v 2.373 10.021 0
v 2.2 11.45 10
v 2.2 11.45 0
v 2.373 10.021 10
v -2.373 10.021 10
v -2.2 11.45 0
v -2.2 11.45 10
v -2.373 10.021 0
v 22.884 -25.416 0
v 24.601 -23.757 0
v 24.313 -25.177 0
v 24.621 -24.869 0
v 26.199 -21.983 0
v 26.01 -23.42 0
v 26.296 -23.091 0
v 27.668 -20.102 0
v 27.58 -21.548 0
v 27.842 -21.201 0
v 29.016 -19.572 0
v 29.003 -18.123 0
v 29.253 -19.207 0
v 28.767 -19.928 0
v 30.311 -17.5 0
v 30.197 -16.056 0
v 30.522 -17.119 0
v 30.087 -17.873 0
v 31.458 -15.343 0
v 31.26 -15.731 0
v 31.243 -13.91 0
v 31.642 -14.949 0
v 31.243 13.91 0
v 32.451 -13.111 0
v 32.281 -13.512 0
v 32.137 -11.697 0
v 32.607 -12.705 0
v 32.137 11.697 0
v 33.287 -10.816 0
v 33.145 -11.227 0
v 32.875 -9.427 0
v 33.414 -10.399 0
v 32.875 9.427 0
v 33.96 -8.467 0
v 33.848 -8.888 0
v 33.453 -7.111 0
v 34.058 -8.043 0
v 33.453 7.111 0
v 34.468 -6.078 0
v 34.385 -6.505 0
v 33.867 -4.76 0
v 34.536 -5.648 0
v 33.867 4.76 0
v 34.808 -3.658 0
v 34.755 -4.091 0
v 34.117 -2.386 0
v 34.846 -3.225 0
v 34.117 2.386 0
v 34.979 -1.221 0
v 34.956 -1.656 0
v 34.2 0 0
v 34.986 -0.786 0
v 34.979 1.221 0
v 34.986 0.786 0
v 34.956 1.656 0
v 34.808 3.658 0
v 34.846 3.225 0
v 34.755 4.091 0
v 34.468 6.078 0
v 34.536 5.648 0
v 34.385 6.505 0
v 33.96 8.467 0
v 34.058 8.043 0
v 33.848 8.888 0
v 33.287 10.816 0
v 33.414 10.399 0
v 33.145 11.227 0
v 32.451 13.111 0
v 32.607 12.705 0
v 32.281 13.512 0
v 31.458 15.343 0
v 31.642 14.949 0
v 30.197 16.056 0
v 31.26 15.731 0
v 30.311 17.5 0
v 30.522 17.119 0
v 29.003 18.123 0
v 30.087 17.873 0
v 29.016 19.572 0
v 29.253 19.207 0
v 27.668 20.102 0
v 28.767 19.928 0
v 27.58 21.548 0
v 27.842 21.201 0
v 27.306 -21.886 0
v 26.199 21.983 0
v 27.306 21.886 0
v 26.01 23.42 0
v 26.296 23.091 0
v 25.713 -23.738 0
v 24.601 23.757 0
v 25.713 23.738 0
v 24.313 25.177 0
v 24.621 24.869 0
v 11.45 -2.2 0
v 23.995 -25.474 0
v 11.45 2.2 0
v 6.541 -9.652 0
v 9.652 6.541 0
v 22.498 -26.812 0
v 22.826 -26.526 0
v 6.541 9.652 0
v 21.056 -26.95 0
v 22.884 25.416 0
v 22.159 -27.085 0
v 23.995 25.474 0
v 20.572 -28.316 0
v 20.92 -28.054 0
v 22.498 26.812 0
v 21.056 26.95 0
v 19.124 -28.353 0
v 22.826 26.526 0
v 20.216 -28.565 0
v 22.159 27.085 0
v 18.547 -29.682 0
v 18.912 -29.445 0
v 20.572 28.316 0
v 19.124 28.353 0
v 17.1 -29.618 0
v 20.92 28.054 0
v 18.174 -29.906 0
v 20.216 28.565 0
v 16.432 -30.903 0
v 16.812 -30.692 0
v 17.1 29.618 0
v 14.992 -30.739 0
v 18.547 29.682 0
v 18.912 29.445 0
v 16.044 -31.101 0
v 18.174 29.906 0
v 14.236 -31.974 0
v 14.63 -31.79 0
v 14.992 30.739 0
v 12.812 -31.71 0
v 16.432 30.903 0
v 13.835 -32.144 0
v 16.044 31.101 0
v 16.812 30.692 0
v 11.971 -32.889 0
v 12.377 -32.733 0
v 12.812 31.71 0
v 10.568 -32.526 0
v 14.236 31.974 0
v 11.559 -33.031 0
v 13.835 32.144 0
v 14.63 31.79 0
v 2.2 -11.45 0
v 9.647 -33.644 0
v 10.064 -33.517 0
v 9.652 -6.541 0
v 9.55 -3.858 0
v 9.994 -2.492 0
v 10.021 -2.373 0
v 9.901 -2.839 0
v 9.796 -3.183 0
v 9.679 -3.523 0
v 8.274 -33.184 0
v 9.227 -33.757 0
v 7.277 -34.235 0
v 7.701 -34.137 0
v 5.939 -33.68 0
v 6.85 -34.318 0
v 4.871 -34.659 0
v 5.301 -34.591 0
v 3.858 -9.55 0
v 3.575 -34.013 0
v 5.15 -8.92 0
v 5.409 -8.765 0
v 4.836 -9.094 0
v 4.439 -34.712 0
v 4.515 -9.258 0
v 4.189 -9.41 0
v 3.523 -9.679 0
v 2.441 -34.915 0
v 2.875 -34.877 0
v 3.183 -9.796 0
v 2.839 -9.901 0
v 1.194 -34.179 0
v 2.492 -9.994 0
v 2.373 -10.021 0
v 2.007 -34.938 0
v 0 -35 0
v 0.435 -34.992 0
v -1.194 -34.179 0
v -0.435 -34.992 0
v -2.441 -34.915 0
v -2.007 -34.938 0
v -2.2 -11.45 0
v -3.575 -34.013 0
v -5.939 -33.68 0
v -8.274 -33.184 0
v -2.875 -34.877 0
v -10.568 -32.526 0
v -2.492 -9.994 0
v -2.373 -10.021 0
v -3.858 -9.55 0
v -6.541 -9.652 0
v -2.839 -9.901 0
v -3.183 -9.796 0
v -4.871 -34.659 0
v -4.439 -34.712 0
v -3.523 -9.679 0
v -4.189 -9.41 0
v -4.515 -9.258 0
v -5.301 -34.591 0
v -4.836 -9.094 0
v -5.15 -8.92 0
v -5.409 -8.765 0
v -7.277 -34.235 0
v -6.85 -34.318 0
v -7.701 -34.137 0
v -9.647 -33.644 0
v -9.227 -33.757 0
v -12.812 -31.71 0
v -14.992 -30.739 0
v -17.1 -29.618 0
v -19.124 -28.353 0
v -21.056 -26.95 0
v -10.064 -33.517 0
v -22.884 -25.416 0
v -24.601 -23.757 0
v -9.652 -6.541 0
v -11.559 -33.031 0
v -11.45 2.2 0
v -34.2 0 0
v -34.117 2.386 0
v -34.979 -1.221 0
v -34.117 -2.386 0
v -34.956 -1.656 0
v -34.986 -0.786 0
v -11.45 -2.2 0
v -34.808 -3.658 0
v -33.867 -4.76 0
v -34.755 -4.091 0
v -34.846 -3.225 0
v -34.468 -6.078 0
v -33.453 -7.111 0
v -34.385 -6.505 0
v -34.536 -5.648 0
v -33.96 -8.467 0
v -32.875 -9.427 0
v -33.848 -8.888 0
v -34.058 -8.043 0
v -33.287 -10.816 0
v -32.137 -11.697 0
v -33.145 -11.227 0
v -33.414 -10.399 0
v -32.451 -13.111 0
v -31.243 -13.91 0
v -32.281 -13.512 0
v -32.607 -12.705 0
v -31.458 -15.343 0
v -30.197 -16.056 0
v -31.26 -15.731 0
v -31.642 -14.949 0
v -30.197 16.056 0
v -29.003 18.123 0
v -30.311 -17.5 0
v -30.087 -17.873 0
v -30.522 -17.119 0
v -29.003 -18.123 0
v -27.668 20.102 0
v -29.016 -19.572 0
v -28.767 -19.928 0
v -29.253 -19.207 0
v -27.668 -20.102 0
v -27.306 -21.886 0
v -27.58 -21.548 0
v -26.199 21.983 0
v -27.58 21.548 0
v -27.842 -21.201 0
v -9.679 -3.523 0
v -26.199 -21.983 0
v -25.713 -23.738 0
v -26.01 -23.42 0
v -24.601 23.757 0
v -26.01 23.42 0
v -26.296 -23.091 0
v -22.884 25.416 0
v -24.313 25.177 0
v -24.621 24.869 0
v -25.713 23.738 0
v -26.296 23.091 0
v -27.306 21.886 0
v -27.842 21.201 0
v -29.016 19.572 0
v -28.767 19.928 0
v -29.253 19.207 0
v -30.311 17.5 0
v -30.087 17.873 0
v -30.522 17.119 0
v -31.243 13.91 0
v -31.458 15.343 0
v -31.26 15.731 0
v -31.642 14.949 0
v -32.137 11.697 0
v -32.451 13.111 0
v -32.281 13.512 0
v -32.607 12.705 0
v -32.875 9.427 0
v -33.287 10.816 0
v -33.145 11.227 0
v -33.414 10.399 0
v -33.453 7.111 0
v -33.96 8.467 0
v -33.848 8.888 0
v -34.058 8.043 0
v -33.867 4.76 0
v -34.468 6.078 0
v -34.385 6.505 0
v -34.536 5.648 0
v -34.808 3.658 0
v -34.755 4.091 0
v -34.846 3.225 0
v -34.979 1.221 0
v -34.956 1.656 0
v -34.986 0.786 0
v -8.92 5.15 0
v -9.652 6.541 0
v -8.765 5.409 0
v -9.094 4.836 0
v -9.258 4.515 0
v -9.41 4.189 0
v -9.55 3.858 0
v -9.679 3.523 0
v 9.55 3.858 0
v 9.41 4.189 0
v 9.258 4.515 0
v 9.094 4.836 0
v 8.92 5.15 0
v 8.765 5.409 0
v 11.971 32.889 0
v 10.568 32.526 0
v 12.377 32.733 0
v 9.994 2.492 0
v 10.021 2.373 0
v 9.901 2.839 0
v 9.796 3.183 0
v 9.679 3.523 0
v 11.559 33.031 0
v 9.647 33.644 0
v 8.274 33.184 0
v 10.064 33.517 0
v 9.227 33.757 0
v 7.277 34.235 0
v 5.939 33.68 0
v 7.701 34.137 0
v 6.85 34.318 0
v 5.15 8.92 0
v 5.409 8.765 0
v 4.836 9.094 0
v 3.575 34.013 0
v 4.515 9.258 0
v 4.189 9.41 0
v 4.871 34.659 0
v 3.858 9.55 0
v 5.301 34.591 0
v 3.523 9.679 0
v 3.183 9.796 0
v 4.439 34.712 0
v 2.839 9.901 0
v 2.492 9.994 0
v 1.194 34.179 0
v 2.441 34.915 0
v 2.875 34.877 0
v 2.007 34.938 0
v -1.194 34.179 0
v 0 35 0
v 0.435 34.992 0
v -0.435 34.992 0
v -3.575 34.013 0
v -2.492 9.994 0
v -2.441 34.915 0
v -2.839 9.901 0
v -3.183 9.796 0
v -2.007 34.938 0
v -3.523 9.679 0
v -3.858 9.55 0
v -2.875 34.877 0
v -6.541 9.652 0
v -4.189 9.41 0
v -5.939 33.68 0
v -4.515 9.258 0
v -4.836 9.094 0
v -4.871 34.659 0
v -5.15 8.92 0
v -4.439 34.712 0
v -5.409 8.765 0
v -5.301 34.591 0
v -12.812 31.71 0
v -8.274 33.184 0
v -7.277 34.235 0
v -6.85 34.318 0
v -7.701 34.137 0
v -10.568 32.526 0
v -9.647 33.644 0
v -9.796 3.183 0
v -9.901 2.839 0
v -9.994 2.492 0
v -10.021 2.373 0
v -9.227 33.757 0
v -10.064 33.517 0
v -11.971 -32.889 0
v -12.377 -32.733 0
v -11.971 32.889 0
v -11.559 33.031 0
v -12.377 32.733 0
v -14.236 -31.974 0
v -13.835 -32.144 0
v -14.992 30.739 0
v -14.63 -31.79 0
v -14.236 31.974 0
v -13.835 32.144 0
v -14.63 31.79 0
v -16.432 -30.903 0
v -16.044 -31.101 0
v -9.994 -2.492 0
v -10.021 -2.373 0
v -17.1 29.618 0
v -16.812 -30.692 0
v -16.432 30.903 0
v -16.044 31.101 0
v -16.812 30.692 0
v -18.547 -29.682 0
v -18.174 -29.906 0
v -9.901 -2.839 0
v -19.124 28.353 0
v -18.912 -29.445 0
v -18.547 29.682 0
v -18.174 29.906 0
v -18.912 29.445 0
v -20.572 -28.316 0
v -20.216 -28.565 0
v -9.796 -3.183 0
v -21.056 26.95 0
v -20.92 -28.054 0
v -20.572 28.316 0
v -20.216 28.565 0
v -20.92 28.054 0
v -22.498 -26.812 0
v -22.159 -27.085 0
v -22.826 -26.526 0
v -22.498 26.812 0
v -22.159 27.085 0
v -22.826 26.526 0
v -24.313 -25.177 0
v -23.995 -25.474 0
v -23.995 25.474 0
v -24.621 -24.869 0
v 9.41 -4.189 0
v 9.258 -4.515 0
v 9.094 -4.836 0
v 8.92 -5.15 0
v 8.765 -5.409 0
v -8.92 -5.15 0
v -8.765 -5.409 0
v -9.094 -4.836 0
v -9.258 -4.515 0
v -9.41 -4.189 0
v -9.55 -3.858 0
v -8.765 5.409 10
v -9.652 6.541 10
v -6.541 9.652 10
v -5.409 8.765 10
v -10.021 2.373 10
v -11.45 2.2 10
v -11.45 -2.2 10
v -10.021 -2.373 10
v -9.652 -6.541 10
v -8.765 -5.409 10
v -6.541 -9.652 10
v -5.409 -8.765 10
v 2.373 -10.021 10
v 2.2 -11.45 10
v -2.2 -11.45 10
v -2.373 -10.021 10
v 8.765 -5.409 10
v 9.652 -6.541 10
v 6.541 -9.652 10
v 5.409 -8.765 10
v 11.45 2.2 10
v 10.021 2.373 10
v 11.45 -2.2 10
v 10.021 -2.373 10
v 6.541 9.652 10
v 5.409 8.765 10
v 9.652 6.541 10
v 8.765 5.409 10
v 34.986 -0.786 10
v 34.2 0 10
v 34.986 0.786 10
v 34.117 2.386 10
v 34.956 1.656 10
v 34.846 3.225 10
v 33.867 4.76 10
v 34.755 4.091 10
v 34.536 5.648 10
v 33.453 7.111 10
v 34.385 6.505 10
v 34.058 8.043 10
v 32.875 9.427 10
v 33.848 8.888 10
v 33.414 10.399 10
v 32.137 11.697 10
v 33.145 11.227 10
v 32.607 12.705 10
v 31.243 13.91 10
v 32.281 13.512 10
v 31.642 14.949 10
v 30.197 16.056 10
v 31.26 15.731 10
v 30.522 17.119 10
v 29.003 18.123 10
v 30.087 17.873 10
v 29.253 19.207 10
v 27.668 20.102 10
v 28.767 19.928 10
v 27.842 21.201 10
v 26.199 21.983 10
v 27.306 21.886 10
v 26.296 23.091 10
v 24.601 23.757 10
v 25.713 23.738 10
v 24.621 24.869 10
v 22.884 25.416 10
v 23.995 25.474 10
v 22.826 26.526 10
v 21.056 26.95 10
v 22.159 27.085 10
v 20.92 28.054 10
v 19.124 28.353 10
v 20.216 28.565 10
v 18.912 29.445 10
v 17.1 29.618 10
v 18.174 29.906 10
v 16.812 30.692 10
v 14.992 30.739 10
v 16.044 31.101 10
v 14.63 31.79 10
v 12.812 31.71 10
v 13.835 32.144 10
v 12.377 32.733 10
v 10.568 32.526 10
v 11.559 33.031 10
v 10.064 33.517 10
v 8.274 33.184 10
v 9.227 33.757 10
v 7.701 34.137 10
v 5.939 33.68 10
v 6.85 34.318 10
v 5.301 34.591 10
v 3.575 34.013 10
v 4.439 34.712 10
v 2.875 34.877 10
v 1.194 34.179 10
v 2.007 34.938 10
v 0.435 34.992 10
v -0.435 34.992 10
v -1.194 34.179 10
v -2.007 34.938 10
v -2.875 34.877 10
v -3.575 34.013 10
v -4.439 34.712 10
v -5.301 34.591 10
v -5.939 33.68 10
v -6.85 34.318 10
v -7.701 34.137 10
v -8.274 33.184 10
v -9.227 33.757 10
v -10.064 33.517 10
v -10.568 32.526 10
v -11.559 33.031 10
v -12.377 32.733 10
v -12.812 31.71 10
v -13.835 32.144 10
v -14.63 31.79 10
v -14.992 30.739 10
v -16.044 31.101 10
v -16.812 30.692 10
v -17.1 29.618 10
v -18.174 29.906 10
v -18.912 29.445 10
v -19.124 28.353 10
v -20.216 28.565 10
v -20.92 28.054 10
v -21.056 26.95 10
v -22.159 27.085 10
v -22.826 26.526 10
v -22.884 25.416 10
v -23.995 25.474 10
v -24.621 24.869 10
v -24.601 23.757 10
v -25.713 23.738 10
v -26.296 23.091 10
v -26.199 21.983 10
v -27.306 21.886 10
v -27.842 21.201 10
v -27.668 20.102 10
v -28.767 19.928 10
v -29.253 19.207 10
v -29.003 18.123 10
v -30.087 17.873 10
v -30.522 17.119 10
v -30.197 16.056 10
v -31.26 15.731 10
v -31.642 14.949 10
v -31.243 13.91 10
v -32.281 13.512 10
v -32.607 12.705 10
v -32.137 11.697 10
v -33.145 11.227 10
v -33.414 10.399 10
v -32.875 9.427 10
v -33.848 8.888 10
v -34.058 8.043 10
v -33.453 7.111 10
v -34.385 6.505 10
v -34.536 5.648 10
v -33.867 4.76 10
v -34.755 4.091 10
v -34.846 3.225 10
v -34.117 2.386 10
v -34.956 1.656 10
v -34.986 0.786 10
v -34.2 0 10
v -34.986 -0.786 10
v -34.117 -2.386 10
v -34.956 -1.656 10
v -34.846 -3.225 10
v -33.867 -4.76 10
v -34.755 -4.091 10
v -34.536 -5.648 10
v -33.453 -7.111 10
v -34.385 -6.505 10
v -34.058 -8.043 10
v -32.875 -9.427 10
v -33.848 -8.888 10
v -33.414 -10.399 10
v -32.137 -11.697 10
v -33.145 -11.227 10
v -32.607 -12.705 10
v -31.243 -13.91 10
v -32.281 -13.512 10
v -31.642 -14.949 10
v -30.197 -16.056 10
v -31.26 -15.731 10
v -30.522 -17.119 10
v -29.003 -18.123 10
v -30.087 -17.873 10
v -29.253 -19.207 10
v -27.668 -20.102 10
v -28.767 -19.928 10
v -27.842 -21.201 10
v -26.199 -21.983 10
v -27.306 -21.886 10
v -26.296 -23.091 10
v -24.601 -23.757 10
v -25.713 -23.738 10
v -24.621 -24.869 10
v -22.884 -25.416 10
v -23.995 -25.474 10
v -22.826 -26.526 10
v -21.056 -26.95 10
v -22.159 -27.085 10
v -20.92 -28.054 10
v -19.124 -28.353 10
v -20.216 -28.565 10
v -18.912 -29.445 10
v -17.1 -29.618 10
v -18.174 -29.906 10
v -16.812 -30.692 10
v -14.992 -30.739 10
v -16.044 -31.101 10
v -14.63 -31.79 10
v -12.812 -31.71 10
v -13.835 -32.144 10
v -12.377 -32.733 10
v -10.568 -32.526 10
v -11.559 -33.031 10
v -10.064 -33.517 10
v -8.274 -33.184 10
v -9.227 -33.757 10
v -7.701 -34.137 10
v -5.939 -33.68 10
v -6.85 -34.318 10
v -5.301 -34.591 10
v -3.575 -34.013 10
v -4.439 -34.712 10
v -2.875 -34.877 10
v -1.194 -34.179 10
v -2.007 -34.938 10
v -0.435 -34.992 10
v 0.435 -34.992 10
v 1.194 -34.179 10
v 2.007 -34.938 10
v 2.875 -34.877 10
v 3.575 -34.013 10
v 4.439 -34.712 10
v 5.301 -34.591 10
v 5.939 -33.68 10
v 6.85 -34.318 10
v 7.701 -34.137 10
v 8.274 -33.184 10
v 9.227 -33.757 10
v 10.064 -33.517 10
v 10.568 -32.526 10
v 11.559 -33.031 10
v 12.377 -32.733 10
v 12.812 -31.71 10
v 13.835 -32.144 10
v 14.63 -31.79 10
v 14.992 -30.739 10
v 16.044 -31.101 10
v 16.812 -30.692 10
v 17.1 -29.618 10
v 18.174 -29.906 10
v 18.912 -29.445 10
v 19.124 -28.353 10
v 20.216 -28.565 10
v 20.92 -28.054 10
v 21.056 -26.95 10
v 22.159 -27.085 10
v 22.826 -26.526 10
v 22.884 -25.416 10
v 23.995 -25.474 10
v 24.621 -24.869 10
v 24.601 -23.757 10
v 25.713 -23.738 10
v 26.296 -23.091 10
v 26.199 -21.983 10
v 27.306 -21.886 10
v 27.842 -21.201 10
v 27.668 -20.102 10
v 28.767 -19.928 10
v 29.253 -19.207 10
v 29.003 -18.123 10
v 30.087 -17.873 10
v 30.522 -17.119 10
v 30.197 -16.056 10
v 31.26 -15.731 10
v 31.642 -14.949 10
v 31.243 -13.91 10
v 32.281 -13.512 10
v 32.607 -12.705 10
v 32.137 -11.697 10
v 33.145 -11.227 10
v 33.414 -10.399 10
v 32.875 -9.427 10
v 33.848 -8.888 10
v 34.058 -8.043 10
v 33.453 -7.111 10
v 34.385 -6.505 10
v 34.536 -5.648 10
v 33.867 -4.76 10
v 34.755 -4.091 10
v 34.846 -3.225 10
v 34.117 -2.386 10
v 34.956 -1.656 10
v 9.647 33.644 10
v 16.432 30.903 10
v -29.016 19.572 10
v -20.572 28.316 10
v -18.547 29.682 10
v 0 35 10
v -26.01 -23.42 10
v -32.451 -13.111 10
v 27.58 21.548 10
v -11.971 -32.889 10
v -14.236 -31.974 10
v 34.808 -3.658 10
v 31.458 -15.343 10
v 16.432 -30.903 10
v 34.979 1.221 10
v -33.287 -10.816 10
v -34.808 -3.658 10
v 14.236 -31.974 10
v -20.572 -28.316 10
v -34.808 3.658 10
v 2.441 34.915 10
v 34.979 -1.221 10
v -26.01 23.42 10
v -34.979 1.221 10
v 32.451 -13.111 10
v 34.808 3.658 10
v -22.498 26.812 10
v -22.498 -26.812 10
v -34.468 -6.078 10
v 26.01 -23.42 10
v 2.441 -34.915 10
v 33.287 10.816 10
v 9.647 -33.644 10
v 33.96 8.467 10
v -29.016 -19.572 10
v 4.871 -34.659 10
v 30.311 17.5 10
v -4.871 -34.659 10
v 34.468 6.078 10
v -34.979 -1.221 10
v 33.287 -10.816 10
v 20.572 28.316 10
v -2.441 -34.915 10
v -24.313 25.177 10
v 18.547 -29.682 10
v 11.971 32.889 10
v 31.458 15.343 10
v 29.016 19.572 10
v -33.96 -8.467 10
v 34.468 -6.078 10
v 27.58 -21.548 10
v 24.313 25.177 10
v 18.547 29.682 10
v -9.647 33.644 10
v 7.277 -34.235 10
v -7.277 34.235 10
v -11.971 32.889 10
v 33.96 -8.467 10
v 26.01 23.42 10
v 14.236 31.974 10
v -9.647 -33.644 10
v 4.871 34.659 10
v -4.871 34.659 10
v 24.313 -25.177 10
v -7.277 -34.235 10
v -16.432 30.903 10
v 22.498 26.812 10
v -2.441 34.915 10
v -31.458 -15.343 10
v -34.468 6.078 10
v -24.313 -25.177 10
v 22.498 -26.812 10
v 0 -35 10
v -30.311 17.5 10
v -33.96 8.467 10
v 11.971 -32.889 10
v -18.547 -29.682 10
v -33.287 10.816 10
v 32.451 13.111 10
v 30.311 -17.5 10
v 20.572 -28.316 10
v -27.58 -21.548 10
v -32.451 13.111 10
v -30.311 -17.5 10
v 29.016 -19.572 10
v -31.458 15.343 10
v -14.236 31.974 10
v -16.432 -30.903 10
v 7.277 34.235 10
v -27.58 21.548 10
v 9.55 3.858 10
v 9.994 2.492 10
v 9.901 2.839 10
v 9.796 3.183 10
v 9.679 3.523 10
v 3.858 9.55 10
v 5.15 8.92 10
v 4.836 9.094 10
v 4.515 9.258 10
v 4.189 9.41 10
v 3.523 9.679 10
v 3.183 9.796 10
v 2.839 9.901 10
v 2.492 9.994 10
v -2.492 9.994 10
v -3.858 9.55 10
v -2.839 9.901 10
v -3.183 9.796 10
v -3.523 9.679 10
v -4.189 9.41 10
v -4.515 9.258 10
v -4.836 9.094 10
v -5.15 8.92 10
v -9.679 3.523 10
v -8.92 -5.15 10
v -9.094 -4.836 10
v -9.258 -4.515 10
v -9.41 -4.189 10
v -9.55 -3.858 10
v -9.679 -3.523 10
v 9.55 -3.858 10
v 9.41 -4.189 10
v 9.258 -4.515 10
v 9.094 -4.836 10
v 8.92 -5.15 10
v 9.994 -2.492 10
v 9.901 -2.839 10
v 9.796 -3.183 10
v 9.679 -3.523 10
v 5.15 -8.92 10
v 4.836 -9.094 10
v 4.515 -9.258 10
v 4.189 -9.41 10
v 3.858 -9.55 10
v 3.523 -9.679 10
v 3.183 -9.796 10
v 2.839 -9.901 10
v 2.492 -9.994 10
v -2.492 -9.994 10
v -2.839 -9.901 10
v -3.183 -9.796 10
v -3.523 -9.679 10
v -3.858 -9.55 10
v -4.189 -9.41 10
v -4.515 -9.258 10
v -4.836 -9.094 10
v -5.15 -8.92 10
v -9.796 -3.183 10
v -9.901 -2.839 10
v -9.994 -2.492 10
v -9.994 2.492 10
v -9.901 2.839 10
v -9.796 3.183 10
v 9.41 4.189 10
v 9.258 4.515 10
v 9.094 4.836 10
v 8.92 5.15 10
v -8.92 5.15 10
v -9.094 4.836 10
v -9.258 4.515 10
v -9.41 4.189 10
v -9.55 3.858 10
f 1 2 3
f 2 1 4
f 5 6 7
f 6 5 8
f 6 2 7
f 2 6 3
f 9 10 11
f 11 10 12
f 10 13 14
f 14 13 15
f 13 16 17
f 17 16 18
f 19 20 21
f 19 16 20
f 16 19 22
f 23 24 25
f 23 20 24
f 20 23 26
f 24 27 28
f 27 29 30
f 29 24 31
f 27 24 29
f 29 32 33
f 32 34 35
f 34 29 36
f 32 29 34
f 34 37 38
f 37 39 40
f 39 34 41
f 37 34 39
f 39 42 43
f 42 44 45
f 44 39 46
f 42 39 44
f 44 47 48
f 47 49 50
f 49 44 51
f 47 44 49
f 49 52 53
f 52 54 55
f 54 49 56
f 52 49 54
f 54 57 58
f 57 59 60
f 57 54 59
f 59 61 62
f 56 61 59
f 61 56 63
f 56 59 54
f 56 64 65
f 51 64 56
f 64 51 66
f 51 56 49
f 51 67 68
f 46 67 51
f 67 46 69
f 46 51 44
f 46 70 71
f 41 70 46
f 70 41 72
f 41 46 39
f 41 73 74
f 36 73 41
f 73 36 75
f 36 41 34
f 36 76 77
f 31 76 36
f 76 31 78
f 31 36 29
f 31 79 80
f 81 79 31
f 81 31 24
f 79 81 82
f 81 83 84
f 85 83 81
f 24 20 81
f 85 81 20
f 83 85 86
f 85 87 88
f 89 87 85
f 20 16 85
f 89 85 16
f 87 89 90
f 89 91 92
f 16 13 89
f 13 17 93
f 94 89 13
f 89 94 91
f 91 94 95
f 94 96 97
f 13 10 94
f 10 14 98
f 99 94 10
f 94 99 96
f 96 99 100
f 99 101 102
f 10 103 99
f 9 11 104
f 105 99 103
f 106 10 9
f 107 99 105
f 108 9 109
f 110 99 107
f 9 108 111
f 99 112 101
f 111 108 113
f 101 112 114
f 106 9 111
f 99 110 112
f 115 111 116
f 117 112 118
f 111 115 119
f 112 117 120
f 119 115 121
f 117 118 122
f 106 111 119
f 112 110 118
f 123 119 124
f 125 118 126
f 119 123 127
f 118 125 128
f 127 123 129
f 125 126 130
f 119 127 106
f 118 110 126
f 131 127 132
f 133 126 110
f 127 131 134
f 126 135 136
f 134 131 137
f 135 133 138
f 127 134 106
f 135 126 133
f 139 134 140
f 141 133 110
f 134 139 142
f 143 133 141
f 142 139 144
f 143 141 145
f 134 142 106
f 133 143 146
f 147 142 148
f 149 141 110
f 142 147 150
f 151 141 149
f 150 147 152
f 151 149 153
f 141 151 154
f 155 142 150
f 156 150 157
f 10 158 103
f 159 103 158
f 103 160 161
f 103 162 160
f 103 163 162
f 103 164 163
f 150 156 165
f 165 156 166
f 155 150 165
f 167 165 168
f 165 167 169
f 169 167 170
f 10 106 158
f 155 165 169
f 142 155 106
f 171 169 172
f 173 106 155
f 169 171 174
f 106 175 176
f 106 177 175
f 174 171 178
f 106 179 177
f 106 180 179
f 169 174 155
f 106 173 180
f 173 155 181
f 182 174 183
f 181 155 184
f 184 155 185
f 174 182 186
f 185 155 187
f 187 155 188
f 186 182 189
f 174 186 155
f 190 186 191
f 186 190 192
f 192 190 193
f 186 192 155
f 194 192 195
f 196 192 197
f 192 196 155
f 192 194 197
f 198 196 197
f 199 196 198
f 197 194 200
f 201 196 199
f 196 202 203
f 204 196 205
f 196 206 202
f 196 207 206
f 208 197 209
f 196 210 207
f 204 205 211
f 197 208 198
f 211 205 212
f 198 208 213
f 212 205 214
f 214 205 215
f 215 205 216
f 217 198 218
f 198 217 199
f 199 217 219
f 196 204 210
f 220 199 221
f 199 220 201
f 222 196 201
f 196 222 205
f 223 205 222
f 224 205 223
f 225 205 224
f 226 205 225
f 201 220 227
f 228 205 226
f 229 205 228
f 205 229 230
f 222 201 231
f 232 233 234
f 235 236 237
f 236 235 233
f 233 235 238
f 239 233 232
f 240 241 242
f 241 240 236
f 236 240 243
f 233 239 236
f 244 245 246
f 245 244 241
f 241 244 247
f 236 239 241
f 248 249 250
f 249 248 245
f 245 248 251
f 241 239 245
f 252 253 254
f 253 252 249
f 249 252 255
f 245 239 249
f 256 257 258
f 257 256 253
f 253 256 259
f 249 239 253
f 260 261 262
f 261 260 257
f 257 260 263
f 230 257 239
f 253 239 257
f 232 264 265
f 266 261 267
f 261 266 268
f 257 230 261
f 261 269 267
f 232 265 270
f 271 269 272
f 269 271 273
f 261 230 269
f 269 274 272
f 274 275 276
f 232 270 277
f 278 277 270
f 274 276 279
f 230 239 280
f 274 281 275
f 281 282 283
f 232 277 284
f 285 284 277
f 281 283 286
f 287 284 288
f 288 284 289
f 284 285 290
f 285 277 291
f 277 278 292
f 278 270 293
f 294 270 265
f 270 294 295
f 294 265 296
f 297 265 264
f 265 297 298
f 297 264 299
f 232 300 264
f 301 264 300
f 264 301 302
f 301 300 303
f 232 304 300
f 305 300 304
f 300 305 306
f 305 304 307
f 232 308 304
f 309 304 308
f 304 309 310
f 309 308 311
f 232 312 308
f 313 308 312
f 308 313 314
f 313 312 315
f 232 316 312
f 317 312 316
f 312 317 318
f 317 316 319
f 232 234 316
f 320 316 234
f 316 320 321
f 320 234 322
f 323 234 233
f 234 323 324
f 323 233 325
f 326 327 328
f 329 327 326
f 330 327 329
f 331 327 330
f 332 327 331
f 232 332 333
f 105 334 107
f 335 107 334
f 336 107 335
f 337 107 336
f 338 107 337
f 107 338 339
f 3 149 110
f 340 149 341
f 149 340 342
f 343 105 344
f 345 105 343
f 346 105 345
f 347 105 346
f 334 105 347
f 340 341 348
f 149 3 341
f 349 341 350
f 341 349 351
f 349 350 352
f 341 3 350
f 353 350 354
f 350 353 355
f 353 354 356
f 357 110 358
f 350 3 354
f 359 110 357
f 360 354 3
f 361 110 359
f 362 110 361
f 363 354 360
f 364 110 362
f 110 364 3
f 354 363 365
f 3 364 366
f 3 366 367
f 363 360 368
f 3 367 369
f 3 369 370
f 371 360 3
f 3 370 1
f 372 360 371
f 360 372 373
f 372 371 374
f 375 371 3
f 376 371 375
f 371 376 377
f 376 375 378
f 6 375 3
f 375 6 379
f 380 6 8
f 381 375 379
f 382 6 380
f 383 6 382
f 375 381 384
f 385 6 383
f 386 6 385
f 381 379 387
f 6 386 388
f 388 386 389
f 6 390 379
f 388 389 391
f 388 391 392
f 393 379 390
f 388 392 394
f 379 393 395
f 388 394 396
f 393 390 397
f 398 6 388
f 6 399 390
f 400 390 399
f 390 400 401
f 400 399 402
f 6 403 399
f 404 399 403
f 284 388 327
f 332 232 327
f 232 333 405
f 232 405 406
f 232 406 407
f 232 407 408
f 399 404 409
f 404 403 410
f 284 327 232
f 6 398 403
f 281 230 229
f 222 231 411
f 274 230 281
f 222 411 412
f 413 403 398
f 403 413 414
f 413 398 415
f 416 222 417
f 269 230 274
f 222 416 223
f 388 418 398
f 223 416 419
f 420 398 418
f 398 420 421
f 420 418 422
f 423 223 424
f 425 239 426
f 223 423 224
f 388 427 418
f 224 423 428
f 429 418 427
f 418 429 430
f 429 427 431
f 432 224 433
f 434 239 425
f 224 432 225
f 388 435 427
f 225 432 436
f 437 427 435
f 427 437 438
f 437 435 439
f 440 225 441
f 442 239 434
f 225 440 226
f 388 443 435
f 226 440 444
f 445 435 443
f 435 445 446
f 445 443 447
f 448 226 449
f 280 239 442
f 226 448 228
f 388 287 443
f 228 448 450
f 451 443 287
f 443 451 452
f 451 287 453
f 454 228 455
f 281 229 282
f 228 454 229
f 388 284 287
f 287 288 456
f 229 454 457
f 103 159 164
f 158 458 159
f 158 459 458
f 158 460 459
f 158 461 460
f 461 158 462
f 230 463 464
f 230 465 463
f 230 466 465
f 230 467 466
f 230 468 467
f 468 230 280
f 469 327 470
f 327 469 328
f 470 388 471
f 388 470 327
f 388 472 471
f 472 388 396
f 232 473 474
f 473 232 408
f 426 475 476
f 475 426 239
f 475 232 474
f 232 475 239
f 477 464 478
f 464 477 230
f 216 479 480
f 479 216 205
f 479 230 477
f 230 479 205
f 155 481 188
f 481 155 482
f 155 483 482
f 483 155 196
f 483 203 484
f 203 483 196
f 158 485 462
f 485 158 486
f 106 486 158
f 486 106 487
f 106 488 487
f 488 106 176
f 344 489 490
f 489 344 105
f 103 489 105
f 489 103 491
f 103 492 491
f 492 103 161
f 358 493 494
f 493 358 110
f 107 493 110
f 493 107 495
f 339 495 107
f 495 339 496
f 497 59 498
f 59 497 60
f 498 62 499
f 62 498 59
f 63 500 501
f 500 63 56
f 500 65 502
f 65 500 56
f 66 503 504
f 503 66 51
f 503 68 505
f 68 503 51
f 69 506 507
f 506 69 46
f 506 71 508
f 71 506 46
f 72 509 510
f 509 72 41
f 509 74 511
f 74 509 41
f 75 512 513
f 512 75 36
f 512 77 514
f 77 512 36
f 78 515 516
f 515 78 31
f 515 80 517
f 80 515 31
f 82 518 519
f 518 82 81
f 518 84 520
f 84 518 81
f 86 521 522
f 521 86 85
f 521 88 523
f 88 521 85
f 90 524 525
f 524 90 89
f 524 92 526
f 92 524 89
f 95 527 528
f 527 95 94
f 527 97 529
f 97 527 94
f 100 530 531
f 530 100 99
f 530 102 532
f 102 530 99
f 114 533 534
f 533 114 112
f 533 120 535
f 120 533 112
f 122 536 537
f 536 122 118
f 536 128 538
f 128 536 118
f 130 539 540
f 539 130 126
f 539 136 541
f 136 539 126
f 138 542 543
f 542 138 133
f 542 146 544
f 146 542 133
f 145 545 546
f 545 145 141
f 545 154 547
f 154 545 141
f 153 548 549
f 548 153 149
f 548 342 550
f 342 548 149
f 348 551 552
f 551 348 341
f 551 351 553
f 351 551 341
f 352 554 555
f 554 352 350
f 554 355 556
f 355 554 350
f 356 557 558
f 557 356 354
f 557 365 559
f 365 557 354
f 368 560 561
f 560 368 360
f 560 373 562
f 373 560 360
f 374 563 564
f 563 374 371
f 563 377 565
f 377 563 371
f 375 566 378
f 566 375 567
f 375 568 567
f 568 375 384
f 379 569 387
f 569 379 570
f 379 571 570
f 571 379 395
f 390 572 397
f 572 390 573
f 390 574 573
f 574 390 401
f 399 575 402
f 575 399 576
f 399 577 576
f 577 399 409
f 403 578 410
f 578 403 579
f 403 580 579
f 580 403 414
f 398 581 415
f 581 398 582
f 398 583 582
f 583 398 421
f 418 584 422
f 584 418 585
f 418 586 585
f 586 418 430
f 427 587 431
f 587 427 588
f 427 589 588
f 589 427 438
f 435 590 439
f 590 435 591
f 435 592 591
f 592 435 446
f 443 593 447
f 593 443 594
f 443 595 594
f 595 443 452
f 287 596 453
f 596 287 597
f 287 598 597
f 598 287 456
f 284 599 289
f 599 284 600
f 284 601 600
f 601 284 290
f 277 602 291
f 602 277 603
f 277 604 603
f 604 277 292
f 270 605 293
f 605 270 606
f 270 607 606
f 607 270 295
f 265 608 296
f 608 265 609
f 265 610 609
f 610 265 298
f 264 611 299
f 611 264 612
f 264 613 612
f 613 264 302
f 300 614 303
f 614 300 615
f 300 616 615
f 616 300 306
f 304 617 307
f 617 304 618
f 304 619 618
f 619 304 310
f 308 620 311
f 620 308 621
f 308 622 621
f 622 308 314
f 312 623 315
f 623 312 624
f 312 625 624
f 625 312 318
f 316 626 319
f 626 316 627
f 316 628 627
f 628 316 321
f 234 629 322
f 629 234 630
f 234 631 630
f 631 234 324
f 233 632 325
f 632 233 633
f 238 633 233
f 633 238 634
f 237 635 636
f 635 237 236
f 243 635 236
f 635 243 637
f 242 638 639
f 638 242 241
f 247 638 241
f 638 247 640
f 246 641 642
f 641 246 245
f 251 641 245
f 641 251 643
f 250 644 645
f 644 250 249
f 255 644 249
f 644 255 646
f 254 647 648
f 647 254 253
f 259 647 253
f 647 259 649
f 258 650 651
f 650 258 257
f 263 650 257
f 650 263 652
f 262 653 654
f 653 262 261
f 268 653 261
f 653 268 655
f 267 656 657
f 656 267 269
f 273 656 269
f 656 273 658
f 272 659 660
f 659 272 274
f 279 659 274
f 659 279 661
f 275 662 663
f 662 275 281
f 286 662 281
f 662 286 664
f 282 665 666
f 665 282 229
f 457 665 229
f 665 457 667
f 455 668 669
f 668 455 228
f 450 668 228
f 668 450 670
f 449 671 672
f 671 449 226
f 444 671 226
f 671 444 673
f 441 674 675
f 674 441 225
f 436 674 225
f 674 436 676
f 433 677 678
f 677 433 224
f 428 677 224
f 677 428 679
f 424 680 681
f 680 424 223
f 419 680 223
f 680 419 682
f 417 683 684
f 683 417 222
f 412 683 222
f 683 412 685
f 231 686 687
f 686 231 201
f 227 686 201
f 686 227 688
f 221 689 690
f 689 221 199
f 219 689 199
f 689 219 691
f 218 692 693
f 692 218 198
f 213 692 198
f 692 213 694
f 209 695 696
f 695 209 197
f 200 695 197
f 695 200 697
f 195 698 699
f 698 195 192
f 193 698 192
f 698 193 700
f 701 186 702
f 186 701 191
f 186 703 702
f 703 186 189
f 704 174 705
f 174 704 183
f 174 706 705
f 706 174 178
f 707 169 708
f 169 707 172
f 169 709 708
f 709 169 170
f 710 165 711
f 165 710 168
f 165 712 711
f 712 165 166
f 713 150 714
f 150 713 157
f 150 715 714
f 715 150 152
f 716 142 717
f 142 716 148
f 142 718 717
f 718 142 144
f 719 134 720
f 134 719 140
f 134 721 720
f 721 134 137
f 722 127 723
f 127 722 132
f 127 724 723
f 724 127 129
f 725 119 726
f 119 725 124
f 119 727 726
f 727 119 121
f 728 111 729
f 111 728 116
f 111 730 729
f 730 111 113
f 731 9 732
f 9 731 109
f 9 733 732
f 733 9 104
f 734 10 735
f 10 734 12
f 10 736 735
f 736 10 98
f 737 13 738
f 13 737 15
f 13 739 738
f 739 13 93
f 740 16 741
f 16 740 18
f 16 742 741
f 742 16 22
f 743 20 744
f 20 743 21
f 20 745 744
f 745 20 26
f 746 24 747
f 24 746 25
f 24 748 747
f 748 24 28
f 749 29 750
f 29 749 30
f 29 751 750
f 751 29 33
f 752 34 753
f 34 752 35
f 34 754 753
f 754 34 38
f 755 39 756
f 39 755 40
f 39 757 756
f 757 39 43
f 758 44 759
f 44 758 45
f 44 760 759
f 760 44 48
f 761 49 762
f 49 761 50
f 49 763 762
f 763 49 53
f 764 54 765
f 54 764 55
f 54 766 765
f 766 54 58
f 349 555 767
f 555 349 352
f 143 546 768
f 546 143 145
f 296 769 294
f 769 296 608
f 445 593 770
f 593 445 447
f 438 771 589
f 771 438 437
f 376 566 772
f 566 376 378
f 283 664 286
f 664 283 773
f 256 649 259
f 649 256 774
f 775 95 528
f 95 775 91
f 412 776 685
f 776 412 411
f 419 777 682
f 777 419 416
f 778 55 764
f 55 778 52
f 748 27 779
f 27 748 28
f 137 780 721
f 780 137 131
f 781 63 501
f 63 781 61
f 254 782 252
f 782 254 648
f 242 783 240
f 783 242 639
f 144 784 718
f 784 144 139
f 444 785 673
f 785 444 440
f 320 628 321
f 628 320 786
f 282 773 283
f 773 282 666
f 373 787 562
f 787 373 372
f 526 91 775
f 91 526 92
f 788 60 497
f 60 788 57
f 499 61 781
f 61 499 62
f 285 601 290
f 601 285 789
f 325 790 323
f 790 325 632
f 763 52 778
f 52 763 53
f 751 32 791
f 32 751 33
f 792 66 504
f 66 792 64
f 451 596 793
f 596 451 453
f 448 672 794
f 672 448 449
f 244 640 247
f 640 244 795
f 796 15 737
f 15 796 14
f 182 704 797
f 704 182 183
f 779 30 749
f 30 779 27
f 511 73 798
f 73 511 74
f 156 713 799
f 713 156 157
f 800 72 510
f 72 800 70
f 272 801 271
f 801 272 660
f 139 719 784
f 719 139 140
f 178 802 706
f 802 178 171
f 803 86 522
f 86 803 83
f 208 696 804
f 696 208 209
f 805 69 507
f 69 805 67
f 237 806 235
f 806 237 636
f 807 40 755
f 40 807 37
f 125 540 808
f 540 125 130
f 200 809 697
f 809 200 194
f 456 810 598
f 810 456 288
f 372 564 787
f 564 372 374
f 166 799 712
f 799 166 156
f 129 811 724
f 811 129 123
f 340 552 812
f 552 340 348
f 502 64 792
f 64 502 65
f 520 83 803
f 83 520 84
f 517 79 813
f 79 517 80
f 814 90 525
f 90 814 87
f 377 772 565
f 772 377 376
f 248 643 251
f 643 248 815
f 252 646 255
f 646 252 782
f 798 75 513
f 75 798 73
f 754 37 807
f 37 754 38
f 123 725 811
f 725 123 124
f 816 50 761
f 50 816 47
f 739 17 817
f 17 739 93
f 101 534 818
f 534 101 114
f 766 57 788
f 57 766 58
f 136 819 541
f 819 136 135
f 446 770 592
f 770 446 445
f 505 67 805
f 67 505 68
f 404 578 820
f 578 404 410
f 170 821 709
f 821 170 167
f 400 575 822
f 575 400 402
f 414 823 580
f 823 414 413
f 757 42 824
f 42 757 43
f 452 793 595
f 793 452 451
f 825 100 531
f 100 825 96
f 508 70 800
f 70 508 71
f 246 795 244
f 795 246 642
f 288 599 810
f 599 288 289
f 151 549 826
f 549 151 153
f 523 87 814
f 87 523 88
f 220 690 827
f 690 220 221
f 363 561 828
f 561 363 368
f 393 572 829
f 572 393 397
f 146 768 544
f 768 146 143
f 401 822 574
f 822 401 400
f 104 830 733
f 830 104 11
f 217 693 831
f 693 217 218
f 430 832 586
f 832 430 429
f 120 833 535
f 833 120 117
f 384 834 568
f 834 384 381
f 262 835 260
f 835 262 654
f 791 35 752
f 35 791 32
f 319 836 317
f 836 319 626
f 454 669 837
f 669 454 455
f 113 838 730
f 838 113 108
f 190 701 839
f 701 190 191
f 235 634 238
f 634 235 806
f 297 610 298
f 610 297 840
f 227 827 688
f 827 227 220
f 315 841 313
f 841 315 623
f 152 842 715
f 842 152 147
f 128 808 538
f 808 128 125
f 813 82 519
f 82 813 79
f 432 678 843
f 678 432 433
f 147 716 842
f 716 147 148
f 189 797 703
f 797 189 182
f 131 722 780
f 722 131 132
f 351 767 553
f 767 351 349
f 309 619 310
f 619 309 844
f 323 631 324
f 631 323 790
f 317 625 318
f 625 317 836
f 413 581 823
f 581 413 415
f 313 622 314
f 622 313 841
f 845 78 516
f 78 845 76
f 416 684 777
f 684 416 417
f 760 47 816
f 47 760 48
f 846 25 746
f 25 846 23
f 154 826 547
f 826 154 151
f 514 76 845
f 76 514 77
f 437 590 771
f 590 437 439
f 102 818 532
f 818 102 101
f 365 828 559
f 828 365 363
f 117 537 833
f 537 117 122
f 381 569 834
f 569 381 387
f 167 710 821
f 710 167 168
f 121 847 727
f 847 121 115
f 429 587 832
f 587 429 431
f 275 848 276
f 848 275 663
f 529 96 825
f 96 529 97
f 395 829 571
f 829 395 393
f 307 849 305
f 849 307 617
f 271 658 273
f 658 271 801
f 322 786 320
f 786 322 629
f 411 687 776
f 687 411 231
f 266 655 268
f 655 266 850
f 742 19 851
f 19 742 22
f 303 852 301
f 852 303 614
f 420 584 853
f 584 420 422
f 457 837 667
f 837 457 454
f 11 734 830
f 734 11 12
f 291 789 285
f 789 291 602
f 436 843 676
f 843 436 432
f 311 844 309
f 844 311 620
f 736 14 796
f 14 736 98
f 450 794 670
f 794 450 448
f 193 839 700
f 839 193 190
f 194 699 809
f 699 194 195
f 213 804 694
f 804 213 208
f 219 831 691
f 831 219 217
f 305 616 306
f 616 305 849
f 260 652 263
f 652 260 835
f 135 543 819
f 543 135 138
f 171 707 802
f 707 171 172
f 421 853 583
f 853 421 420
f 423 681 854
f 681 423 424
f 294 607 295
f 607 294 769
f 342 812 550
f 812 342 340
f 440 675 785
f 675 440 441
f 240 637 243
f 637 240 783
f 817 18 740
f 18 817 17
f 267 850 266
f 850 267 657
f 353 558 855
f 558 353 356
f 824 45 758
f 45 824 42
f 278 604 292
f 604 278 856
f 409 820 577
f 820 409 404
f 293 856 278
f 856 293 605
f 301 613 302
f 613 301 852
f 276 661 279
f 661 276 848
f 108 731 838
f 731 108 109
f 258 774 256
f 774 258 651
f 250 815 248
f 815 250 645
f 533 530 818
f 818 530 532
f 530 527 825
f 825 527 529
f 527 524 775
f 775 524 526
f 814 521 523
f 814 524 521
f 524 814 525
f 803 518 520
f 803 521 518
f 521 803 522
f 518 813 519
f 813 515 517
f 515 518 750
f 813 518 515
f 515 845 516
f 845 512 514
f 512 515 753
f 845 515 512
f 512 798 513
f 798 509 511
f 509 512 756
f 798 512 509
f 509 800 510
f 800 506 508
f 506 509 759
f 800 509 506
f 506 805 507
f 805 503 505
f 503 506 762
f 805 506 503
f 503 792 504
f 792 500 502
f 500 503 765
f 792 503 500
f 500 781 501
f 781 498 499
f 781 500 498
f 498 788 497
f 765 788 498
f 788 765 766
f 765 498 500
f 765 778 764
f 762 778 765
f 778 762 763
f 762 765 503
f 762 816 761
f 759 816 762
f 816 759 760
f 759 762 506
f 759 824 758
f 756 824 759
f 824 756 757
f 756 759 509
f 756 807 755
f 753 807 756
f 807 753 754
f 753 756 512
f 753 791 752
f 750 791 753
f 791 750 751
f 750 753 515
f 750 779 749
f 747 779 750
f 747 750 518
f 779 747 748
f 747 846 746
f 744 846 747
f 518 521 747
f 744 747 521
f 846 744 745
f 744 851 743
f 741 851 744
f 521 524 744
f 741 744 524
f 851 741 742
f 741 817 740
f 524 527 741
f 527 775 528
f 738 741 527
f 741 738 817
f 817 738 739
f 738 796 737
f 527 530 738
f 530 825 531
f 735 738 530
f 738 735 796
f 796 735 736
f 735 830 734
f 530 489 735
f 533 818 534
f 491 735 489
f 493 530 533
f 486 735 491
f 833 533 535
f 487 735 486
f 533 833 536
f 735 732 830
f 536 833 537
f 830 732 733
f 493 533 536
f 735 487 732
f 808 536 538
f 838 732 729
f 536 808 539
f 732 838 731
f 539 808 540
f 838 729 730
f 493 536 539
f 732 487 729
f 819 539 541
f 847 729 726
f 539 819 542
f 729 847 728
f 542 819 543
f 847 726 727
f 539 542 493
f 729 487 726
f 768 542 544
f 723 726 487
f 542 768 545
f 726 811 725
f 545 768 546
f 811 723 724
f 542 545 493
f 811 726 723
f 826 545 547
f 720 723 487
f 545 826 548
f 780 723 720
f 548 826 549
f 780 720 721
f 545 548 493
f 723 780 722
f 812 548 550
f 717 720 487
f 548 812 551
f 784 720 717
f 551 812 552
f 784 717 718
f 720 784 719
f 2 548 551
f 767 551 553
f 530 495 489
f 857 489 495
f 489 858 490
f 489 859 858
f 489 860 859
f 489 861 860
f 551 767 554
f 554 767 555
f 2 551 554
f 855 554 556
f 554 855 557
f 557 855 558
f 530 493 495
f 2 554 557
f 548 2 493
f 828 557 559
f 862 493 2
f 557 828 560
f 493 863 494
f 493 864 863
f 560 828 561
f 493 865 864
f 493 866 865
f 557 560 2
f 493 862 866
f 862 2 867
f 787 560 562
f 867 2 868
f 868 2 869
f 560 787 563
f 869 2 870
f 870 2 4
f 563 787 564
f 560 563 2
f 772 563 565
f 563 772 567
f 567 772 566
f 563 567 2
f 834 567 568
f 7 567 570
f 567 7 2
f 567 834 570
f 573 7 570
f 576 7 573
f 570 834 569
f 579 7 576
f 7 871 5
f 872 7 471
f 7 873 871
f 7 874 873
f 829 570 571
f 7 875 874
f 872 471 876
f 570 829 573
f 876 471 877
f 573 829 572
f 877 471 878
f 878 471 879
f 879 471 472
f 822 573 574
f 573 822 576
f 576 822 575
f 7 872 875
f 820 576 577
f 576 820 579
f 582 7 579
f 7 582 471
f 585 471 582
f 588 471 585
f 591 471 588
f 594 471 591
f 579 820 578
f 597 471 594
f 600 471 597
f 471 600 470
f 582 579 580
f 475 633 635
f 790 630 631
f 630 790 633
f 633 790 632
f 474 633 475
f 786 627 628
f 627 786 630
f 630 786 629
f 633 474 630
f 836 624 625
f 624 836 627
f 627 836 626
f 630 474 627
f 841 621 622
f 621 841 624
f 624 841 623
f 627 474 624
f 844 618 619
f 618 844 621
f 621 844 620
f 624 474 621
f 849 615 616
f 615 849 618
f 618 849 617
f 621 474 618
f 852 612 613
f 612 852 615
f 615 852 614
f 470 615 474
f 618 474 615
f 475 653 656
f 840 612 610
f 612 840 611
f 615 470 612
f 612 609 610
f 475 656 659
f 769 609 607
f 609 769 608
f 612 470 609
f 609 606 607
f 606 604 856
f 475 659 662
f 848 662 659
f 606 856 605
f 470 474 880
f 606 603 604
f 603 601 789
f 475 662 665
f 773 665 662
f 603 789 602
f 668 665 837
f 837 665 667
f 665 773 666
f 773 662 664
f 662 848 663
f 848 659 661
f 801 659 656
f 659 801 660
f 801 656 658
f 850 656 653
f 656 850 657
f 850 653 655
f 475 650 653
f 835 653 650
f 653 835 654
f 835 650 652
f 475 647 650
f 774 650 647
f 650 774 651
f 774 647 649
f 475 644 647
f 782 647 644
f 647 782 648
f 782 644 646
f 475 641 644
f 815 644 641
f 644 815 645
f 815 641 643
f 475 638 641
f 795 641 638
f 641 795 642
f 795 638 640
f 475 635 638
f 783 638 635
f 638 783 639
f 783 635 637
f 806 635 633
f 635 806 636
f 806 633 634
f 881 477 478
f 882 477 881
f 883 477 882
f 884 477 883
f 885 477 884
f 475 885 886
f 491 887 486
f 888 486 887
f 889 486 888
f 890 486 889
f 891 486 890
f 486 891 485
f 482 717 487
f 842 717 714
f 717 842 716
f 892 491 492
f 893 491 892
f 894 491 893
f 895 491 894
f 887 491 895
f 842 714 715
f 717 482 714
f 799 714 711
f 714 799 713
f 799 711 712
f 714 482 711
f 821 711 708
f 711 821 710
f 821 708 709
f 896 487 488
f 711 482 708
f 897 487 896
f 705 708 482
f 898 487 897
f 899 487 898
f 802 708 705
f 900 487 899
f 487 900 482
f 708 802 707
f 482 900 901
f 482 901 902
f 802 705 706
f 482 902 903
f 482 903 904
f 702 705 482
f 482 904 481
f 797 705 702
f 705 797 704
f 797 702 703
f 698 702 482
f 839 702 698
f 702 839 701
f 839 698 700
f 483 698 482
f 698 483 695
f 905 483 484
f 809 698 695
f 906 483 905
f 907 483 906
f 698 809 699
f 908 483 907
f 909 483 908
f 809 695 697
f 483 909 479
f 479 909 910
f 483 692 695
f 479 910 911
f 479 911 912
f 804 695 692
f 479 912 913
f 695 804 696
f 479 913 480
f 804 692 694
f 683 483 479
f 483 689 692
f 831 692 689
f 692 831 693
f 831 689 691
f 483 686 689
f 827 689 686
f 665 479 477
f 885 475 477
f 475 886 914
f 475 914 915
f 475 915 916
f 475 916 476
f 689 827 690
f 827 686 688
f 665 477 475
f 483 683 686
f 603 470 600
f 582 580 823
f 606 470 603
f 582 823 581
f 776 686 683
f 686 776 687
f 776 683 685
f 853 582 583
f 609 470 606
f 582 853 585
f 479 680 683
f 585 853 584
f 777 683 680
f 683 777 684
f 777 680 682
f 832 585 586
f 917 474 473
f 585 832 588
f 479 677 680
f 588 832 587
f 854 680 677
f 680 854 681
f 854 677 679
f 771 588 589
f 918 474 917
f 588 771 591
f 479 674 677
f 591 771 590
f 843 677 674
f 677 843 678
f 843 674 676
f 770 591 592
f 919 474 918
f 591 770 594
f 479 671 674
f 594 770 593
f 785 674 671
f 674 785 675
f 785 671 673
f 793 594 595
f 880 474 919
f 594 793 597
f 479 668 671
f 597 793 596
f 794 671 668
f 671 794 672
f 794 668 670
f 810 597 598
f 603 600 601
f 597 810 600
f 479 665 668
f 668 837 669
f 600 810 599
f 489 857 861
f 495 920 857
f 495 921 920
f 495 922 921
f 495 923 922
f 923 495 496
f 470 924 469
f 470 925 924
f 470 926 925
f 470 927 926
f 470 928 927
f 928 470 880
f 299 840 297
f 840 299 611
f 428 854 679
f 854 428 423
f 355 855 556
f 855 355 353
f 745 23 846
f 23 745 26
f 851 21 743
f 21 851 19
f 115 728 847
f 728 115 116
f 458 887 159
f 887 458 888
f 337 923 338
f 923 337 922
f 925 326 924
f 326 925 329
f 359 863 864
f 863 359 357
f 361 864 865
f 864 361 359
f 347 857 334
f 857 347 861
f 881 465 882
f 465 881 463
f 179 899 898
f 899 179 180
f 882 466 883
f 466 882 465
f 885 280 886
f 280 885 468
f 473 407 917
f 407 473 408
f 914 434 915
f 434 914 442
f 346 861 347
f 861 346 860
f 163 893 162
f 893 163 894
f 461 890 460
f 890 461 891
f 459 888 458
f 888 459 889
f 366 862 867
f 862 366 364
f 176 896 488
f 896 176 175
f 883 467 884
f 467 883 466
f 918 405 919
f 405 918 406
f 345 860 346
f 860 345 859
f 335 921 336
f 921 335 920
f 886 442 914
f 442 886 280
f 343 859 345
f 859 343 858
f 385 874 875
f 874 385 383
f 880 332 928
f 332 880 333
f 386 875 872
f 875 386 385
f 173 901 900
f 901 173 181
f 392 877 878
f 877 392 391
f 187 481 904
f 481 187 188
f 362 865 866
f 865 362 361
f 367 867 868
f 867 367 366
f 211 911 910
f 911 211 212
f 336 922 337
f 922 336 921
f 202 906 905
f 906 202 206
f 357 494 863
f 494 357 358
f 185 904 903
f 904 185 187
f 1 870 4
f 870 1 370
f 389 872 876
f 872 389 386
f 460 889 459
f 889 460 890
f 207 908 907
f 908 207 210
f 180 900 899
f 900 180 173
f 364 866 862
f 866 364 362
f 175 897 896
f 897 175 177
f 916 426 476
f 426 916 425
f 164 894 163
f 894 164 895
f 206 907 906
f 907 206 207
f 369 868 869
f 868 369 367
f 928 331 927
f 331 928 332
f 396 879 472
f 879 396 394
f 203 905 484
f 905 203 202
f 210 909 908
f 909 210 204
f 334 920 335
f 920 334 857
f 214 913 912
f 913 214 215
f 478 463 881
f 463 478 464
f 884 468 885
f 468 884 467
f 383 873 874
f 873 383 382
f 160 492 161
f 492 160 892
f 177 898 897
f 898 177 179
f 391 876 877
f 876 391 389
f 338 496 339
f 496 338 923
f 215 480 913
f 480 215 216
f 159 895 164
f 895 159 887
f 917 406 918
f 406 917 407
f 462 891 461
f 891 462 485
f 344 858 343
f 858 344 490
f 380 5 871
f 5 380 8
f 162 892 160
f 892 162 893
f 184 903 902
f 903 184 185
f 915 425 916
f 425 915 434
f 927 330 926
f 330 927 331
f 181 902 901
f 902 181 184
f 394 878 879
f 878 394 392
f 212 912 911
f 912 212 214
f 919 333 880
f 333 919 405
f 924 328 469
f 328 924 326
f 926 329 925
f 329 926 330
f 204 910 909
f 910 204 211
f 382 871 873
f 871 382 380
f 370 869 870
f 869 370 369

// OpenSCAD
// fine focus knob for CPC 800

// stock knob dimensions
OD_inner = 20.2; 
OD_outer = 22.1;
rib_width = 4.7;
rib_locations = [0, 45, 90, 135, 180, 225, 270, 315];
rib_ht = 0.5 * ( OD_outer - OD_inner );

// fine focus knob dimensions
tol = 0.2;
OD = 70.0;
rO = 0.5 * OD;
thk = 10.0;
rI = 0.5 * OD_inner + tol;
rR = rI + rib_ht + tol;

// rib cutouts
b1 = rib_width + 0.5* tol;
half_b1 = 0.5 * b1;
b2 = rib_width - 0.2 - 0.5*tol;
half_b2 = 0.5 * b2;
knurl = 0.8;

$fn = 180;

difference() {
	cylinder( h = thk, r1 = rO, r2 = rO ); // main solid wheel
	cylinder( h = thk+0.1, r1 = rI, r2 = rI ); // cut out the small cylinder
	// next, cut out for the ribs
	for( a = rib_locations )
		rotate( a )
			linear_extrude( height = thk+0.1 )
				polygon( points = [ [-half_b1, rI - 0.5], [-half_b2, rR], 
									[half_b2, rR], [ half_b1, rI - 0.5] ] );

	// next, cut out notches around outside perimeter for grip
	for( i = [0: 4: 360] )
		rotate( i )
			linear_extrude( height = thk+0.1 )
				polygon( points = [ [rO - knurl, 0 ], [rO+knurl, -2*knurl], 
							[rO + knurl, 2*knurl] ] );
	
} // difference
